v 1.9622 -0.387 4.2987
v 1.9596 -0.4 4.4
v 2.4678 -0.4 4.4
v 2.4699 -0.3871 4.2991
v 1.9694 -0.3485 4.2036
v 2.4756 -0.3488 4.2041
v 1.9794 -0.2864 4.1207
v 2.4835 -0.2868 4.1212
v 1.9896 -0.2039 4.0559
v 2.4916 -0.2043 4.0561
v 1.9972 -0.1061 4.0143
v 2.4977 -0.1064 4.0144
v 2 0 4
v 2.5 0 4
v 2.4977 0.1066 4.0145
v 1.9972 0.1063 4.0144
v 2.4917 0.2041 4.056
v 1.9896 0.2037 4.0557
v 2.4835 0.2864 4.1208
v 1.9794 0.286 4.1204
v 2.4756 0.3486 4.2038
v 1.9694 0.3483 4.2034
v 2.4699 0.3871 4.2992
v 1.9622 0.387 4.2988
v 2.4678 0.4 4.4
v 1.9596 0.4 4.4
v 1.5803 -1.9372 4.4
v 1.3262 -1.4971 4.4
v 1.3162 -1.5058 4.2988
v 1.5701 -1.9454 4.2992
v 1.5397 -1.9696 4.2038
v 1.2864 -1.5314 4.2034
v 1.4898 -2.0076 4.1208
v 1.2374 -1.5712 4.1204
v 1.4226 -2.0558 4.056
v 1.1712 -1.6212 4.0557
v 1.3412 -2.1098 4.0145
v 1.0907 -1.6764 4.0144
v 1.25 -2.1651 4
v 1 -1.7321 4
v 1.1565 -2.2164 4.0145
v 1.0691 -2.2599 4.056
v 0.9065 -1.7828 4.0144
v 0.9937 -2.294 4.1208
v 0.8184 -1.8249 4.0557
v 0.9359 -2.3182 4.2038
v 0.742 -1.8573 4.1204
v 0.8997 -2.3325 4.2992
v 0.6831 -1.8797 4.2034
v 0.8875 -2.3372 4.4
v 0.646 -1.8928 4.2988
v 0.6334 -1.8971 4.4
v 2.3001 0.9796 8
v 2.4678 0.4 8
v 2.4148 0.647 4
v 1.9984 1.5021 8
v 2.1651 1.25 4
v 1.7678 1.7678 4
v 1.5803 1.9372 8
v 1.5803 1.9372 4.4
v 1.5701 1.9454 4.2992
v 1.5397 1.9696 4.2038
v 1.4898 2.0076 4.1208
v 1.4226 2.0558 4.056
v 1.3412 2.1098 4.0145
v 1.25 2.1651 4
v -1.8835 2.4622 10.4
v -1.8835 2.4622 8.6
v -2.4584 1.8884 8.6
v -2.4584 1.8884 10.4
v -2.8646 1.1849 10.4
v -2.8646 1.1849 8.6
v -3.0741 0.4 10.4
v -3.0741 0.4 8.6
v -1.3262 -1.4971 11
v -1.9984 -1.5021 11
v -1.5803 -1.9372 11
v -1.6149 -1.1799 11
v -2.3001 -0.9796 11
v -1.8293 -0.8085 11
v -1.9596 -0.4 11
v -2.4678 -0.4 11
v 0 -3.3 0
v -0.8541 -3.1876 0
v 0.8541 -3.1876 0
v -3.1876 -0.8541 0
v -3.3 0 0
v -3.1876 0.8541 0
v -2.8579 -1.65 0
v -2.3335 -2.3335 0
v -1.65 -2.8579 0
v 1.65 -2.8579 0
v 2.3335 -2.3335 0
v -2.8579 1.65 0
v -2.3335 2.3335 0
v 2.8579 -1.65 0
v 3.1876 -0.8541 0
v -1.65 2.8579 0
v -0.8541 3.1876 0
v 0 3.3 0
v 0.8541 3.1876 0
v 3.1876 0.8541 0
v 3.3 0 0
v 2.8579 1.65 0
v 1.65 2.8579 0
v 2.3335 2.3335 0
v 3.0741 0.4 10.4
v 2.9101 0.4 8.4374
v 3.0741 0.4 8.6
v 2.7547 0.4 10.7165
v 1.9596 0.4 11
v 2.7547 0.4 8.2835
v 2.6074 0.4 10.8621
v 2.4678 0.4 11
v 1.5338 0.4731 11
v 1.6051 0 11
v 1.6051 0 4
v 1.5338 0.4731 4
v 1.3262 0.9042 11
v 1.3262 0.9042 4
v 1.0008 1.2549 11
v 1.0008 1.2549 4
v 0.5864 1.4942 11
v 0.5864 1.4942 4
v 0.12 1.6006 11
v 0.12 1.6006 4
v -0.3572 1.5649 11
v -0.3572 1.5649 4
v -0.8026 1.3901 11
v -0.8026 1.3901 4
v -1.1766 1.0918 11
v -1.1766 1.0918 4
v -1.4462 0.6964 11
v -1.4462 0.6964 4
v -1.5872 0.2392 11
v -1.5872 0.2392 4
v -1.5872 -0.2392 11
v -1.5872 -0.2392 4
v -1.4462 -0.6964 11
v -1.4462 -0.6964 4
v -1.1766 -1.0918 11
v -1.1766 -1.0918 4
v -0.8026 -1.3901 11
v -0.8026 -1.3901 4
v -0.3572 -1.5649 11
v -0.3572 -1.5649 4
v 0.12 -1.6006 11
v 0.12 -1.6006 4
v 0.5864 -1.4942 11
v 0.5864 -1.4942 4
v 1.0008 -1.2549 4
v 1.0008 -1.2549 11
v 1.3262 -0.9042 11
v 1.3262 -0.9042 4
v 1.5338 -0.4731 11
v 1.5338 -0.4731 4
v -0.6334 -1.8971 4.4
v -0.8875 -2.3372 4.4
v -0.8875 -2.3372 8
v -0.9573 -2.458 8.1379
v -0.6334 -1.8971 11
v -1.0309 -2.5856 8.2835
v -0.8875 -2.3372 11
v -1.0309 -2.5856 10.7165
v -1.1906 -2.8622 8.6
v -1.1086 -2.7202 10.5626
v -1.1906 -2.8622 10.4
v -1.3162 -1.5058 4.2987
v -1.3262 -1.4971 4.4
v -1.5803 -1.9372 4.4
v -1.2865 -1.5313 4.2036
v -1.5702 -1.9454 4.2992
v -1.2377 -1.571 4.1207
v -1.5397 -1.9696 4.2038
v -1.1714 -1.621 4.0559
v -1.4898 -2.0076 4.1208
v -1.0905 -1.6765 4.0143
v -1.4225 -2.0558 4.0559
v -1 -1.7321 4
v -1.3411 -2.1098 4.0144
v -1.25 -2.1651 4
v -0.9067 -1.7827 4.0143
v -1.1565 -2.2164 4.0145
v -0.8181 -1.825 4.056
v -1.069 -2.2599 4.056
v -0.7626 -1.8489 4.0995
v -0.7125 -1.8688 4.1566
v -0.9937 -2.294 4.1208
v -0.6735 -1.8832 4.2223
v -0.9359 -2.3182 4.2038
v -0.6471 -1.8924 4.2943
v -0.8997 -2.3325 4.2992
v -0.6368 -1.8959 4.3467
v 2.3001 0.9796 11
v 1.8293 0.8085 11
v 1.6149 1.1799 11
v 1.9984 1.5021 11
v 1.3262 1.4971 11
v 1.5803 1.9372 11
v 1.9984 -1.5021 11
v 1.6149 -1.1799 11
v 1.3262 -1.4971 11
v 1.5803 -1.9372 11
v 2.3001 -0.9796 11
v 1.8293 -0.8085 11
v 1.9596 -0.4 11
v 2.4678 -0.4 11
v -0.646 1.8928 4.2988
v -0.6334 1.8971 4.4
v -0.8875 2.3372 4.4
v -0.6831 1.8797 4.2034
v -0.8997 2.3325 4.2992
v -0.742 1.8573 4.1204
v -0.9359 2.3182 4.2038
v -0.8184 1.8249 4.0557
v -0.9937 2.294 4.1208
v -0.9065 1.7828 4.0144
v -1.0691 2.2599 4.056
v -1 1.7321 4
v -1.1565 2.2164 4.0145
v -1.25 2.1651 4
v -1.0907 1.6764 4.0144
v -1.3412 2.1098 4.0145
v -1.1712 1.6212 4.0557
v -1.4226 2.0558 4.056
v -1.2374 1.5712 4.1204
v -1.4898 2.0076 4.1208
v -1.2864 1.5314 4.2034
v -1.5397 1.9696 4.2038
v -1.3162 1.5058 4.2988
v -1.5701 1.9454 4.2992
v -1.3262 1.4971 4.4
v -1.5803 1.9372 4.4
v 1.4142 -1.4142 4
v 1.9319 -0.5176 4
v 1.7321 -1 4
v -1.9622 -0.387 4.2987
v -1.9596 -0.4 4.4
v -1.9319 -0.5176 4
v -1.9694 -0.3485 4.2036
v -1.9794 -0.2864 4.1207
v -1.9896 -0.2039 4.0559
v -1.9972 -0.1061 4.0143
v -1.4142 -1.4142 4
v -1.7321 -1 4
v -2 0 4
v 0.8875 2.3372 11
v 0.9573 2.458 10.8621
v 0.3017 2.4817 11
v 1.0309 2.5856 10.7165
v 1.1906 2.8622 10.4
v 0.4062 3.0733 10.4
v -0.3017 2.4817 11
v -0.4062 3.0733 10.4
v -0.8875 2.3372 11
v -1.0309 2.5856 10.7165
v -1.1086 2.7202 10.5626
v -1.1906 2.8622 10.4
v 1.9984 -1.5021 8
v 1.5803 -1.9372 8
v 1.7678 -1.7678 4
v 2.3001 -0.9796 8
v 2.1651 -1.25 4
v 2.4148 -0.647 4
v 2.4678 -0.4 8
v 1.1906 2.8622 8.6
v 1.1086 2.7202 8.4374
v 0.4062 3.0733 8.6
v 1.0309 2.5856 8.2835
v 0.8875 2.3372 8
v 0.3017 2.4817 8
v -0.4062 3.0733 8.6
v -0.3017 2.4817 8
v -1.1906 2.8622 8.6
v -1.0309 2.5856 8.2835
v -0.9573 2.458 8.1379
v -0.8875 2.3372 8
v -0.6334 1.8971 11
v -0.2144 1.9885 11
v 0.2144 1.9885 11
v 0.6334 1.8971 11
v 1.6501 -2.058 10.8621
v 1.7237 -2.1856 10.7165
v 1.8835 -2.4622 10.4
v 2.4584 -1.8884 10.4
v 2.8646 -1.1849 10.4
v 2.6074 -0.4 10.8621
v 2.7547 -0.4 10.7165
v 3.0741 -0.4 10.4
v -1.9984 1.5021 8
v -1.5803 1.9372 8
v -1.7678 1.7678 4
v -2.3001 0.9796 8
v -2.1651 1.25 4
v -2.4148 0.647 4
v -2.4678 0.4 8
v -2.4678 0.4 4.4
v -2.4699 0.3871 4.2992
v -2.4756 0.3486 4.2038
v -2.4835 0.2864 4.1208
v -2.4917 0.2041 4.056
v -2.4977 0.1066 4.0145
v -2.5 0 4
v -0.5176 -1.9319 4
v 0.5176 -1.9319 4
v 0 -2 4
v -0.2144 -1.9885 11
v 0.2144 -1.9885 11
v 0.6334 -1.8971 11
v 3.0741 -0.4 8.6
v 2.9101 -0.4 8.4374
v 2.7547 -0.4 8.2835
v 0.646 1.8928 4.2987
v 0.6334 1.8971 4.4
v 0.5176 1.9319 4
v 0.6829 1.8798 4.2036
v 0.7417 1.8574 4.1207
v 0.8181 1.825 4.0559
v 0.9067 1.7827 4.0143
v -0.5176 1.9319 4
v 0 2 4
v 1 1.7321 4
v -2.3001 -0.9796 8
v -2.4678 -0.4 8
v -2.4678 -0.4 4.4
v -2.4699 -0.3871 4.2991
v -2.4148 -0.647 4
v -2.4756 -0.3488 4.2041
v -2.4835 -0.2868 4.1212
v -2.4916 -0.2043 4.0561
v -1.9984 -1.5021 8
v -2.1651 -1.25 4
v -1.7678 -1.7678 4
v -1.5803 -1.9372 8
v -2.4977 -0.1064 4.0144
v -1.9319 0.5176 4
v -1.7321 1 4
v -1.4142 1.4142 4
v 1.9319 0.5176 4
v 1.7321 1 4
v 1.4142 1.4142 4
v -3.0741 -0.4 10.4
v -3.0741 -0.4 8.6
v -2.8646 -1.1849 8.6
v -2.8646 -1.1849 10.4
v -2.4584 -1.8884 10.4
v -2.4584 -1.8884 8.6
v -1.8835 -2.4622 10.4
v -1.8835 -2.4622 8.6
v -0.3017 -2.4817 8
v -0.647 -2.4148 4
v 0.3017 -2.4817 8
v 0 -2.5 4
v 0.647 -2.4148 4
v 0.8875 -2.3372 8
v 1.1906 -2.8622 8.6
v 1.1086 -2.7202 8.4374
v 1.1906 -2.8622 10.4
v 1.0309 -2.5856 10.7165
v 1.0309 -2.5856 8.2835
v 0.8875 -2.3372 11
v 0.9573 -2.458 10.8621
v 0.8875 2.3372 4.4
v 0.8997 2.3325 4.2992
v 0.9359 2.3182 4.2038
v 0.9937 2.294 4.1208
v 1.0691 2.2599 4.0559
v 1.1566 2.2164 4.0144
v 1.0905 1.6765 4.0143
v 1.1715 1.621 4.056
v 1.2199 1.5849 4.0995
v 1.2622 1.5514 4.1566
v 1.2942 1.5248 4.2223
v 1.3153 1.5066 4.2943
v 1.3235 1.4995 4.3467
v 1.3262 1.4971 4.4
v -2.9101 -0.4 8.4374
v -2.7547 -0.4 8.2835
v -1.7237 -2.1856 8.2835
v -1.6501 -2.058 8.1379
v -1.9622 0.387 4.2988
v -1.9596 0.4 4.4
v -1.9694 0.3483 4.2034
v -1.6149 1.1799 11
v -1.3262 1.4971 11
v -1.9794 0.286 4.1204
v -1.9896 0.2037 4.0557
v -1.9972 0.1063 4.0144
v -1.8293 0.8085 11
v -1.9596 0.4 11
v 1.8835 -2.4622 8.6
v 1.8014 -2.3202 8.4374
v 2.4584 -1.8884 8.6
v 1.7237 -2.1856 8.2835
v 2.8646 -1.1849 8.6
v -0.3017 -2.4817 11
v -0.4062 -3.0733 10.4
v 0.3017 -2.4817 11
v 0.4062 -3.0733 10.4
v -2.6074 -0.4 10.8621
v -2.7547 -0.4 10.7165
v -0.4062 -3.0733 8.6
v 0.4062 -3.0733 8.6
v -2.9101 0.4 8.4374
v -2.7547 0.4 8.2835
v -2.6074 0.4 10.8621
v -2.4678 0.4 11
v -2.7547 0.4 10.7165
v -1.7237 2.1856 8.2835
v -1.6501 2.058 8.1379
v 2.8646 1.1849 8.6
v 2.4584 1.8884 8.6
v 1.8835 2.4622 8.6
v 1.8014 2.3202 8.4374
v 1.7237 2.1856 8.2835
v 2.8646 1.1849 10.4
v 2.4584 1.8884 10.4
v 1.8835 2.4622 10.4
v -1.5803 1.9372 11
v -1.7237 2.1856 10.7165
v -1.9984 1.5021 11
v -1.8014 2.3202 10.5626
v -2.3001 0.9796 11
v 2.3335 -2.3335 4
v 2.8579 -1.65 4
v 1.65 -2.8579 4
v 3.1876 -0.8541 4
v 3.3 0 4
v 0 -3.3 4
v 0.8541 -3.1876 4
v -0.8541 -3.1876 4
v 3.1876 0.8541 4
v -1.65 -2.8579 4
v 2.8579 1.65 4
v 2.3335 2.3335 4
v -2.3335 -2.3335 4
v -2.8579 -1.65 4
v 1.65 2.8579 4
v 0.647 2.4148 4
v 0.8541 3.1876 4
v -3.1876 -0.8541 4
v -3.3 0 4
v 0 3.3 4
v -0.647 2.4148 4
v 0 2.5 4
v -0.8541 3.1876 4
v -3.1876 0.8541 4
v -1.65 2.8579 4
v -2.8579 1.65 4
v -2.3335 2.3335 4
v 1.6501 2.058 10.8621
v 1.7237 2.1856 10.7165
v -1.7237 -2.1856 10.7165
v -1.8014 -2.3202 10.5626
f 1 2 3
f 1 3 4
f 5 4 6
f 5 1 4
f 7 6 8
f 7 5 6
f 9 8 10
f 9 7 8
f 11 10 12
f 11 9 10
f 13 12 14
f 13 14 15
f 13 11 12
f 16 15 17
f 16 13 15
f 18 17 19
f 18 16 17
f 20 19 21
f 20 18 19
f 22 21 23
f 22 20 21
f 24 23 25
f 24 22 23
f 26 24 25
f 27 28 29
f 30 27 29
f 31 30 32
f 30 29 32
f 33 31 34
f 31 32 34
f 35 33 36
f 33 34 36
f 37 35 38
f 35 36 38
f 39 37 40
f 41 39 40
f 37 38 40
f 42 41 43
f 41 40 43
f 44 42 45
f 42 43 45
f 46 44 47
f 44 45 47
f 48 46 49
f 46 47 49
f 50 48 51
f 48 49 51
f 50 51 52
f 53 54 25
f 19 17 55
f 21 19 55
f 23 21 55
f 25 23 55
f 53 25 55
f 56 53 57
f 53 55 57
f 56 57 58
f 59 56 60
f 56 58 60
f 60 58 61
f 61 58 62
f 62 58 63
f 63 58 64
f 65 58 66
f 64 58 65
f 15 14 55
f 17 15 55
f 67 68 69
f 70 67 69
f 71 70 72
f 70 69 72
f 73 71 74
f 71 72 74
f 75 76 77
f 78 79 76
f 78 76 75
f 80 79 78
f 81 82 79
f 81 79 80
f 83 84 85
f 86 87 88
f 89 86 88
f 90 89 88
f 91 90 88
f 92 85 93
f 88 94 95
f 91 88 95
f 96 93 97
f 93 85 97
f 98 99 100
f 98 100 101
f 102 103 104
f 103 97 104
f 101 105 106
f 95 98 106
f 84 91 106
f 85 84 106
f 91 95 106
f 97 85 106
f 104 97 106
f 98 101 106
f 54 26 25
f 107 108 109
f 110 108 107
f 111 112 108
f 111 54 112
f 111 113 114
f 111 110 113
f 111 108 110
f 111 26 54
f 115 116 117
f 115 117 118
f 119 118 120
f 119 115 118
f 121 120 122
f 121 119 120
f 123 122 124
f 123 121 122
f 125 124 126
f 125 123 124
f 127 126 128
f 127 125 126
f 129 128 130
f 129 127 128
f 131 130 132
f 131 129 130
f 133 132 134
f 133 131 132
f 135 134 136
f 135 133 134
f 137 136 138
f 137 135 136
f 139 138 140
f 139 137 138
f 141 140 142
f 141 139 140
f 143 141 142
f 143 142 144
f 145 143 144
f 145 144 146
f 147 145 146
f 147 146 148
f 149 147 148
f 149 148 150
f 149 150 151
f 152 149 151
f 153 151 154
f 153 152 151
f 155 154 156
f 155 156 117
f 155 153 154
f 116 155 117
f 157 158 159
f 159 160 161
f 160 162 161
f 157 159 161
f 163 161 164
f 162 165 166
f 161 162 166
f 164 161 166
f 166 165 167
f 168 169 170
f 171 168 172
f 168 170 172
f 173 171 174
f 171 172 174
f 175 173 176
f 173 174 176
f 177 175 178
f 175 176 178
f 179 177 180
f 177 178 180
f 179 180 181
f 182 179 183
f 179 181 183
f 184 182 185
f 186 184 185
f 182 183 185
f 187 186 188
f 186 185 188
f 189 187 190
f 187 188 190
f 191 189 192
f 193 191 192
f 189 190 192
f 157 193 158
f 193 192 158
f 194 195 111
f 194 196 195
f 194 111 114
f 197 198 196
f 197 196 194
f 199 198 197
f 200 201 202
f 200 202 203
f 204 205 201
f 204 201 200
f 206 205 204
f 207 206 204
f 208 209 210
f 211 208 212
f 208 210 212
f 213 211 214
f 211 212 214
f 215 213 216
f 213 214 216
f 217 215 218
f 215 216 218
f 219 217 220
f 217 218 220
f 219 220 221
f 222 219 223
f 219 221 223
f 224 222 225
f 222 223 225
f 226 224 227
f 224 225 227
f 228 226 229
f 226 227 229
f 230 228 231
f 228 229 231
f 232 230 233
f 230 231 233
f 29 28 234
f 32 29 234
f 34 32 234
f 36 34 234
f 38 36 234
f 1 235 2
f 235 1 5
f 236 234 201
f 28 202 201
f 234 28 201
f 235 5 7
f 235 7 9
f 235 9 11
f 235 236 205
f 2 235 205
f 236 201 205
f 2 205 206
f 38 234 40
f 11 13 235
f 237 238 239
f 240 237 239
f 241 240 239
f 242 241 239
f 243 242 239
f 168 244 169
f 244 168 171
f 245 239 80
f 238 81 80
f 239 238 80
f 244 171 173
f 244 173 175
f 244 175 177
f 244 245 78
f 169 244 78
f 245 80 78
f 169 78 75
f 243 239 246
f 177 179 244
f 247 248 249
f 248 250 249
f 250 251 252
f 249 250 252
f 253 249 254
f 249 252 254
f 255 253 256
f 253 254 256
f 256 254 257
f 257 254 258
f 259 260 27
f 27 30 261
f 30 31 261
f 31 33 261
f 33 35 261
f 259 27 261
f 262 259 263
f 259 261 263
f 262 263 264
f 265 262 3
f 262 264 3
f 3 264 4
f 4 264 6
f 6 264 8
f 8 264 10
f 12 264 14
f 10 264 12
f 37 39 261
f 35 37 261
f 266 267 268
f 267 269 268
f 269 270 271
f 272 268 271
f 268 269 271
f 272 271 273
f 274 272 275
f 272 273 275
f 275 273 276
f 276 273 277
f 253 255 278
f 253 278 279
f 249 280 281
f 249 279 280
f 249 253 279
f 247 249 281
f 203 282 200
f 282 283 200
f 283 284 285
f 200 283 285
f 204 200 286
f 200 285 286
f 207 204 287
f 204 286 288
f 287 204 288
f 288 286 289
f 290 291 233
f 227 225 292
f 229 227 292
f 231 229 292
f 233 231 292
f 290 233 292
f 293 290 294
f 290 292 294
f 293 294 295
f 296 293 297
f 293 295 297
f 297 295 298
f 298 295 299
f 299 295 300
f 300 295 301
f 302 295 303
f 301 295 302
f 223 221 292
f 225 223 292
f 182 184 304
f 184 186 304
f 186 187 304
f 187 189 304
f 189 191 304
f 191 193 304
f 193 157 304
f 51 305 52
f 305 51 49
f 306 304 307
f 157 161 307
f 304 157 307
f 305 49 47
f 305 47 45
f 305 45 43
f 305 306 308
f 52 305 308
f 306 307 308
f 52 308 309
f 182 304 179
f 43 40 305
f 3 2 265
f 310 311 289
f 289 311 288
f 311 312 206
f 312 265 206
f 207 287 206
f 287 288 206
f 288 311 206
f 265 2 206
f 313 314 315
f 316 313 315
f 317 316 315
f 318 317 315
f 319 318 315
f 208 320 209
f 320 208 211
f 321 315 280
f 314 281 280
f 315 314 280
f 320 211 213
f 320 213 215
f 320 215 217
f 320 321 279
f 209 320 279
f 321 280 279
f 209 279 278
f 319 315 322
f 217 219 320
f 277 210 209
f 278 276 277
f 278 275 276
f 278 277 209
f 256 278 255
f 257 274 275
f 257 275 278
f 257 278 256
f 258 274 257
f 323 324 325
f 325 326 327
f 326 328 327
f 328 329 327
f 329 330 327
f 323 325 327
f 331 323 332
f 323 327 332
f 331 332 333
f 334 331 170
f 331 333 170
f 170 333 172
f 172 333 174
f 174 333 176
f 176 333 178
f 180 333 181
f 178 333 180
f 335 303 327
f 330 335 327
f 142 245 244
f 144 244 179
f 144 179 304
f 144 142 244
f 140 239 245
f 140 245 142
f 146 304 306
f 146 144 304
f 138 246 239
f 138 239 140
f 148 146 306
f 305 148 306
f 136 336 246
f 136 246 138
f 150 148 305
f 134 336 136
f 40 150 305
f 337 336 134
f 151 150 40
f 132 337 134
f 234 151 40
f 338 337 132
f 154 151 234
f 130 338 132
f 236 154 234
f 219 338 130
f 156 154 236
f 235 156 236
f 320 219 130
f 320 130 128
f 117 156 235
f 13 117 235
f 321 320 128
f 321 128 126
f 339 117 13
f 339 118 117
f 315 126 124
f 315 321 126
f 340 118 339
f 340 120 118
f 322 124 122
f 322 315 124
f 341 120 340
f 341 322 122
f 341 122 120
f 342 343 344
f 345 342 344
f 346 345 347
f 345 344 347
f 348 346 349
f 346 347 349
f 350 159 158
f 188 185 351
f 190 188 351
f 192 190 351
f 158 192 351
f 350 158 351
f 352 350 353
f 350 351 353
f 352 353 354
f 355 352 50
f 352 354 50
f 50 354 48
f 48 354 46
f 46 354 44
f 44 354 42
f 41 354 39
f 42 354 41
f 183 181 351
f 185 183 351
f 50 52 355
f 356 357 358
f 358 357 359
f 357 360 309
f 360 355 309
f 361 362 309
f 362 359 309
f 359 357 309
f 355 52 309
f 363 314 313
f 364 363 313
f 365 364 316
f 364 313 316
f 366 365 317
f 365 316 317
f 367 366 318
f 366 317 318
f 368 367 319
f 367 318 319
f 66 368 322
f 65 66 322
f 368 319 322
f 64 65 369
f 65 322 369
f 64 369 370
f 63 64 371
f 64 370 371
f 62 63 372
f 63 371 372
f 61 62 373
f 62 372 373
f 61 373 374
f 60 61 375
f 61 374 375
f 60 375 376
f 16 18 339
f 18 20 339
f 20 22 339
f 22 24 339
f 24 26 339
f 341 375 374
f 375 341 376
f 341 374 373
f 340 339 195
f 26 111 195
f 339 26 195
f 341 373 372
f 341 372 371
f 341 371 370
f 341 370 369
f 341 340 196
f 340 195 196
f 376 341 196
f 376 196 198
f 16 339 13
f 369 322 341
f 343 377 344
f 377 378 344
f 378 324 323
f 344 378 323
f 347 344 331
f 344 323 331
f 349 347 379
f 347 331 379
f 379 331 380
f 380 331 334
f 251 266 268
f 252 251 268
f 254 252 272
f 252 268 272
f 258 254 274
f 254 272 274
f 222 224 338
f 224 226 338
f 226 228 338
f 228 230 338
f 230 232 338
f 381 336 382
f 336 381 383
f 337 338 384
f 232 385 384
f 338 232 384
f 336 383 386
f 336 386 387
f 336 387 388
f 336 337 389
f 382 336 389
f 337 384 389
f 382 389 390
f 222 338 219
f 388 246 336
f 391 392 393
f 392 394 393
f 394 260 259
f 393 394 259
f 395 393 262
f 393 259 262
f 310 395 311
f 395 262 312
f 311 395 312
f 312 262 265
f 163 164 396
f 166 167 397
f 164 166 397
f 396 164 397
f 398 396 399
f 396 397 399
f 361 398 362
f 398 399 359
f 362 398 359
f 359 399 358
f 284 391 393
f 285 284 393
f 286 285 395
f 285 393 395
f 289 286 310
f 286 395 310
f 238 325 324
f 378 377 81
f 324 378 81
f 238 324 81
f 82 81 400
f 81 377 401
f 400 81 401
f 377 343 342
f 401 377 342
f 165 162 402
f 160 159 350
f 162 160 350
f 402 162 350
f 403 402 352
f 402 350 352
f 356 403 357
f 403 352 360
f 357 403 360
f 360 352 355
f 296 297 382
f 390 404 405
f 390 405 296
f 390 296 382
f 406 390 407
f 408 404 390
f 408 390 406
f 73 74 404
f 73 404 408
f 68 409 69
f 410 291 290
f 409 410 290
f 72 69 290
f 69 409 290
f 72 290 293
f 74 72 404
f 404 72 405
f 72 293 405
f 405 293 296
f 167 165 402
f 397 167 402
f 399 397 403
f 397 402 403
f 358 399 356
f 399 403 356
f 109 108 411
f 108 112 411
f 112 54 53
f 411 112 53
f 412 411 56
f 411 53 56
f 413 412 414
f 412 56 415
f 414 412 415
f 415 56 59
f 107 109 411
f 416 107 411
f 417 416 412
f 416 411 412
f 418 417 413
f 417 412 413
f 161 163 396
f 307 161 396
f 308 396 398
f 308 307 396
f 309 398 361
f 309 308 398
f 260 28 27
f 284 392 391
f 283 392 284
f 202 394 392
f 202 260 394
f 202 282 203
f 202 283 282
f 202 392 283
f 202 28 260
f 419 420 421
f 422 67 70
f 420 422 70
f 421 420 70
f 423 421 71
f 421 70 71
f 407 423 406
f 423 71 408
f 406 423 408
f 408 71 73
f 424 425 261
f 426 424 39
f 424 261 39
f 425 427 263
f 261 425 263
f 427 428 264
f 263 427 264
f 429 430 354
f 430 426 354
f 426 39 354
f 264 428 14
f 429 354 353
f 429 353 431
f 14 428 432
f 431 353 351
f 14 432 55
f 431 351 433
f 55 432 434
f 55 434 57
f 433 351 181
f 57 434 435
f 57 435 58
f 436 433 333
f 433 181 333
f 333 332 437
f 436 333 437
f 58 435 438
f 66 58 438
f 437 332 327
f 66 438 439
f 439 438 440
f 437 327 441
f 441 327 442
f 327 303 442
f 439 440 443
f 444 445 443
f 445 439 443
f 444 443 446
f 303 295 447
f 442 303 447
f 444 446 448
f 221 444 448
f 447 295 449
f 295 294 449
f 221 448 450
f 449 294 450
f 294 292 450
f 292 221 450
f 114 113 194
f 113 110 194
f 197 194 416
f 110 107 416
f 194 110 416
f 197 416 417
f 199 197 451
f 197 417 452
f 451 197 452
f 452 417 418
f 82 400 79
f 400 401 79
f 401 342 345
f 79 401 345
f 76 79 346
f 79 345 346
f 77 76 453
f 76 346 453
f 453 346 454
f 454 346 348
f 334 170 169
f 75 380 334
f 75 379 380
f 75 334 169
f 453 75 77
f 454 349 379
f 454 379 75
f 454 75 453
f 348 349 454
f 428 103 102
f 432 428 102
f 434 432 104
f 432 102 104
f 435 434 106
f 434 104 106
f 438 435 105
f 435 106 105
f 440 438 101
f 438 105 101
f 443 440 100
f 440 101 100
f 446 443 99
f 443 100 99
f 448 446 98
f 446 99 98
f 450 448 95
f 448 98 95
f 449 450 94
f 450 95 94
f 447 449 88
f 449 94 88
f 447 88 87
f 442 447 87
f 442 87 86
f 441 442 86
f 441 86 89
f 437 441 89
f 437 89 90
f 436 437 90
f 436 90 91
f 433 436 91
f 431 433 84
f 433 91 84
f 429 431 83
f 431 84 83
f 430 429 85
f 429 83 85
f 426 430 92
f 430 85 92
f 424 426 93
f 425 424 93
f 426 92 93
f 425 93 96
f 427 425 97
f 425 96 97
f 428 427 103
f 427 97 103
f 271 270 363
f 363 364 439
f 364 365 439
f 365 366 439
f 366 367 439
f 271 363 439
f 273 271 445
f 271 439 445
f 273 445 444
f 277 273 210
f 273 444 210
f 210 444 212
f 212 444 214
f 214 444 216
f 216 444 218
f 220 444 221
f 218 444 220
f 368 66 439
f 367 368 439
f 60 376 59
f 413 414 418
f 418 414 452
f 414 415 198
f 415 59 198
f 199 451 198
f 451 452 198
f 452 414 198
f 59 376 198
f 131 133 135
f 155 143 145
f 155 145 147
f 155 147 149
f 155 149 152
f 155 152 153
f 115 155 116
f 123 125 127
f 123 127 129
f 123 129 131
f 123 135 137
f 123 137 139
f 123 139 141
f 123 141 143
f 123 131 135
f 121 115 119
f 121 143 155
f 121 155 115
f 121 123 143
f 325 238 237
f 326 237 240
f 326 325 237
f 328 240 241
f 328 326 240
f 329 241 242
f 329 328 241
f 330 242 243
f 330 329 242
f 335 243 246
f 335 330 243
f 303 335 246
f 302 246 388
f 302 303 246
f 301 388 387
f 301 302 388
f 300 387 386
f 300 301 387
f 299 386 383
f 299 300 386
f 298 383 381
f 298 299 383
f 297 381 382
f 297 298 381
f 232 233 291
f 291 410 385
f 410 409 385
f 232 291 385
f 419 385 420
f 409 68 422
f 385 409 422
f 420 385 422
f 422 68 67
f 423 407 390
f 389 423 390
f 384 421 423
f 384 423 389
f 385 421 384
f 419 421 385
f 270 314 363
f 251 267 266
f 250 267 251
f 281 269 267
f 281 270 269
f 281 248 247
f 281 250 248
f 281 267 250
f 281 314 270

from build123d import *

# Parameters (mm, degrees)
SKETCH004_R          = 2.5
PAD001_DEPTH         = 11
POCKET003_DEPTH      = 5
POCKET003_DEPTH_BACK = 5
POLARPATTERN_COUNT   = 3
SKETCH007_R          = 2
POCKET004_DEPTH      = 7
SKETCH008_R          = 1.605124
PAD002_DEPTH         = 7


with BuildPart() as part:
    # Sketch004 → Pad001 (new body)
    with BuildSketch(Plane.XY):
        Circle(SKETCH004_R)
    extrude(amount=PAD001_DEPTH)

    # Sketch005 → Revolution (revolve)
    with BuildSketch(Plane.XZ):
        Polygon((2.5, 11), (3.1, 10.4), (3.1, 8.6), (2.5, 8), align=None)
        Polygon((2.5, 1.5), (2.3, 1.5), (2.3, 4), (3.3, 4), (3.3, 0), (2.5, 0), align=None)
    revolve(axis=Axis((0, 0, 0), (0, 0, 1)))

    # Sketch006 → Pocket003 (cut, two sides)
    with BuildSketch(Plane.YZ) as pocket003_sk:
        with BuildLine():
            ThreePointArc((-0.4, 4.4), (0, 4), (0.4, 4.4))
            Line((0.4, 4.4), (0.4, 14.4))
            ThreePointArc((0.4, 14.4), (0, 14.8), (-0.4, 14.4))
            Line((-0.4, 4.4), (-0.4, 14.4))
        make_face()
    pocket003 = extrude(amount=-POCKET003_DEPTH, mode=Mode.SUBTRACT) + extrude(pocket003_sk.sketch, amount=POCKET003_DEPTH_BACK, mode=Mode.SUBTRACT)

    # PolarPattern: Pocket003 ×3 about axis
    polarpattern_axis = Axis((0, 0, 0), (0, 0, 1))
    for i in range(1, POLARPATTERN_COUNT):
        add(pocket003.rotate(polarpattern_axis, i * 360 / POLARPATTERN_COUNT), mode=Mode.SUBTRACT)

    # Sketch007 (on Face49 of PolarPattern) → Pocket004 (cut)
    with BuildSketch(Plane.XY.offset(11)):
        Circle(SKETCH007_R)
    extrude(amount=-POCKET004_DEPTH, mode=Mode.SUBTRACT)

    # Sketch008 (on Face46 of Pocket004) → Pad002 (join)
    with BuildSketch(Plane.XY.offset(11)):
        Circle(SKETCH008_R)
    extrude(amount=-PAD002_DEPTH)


solid = part.part
